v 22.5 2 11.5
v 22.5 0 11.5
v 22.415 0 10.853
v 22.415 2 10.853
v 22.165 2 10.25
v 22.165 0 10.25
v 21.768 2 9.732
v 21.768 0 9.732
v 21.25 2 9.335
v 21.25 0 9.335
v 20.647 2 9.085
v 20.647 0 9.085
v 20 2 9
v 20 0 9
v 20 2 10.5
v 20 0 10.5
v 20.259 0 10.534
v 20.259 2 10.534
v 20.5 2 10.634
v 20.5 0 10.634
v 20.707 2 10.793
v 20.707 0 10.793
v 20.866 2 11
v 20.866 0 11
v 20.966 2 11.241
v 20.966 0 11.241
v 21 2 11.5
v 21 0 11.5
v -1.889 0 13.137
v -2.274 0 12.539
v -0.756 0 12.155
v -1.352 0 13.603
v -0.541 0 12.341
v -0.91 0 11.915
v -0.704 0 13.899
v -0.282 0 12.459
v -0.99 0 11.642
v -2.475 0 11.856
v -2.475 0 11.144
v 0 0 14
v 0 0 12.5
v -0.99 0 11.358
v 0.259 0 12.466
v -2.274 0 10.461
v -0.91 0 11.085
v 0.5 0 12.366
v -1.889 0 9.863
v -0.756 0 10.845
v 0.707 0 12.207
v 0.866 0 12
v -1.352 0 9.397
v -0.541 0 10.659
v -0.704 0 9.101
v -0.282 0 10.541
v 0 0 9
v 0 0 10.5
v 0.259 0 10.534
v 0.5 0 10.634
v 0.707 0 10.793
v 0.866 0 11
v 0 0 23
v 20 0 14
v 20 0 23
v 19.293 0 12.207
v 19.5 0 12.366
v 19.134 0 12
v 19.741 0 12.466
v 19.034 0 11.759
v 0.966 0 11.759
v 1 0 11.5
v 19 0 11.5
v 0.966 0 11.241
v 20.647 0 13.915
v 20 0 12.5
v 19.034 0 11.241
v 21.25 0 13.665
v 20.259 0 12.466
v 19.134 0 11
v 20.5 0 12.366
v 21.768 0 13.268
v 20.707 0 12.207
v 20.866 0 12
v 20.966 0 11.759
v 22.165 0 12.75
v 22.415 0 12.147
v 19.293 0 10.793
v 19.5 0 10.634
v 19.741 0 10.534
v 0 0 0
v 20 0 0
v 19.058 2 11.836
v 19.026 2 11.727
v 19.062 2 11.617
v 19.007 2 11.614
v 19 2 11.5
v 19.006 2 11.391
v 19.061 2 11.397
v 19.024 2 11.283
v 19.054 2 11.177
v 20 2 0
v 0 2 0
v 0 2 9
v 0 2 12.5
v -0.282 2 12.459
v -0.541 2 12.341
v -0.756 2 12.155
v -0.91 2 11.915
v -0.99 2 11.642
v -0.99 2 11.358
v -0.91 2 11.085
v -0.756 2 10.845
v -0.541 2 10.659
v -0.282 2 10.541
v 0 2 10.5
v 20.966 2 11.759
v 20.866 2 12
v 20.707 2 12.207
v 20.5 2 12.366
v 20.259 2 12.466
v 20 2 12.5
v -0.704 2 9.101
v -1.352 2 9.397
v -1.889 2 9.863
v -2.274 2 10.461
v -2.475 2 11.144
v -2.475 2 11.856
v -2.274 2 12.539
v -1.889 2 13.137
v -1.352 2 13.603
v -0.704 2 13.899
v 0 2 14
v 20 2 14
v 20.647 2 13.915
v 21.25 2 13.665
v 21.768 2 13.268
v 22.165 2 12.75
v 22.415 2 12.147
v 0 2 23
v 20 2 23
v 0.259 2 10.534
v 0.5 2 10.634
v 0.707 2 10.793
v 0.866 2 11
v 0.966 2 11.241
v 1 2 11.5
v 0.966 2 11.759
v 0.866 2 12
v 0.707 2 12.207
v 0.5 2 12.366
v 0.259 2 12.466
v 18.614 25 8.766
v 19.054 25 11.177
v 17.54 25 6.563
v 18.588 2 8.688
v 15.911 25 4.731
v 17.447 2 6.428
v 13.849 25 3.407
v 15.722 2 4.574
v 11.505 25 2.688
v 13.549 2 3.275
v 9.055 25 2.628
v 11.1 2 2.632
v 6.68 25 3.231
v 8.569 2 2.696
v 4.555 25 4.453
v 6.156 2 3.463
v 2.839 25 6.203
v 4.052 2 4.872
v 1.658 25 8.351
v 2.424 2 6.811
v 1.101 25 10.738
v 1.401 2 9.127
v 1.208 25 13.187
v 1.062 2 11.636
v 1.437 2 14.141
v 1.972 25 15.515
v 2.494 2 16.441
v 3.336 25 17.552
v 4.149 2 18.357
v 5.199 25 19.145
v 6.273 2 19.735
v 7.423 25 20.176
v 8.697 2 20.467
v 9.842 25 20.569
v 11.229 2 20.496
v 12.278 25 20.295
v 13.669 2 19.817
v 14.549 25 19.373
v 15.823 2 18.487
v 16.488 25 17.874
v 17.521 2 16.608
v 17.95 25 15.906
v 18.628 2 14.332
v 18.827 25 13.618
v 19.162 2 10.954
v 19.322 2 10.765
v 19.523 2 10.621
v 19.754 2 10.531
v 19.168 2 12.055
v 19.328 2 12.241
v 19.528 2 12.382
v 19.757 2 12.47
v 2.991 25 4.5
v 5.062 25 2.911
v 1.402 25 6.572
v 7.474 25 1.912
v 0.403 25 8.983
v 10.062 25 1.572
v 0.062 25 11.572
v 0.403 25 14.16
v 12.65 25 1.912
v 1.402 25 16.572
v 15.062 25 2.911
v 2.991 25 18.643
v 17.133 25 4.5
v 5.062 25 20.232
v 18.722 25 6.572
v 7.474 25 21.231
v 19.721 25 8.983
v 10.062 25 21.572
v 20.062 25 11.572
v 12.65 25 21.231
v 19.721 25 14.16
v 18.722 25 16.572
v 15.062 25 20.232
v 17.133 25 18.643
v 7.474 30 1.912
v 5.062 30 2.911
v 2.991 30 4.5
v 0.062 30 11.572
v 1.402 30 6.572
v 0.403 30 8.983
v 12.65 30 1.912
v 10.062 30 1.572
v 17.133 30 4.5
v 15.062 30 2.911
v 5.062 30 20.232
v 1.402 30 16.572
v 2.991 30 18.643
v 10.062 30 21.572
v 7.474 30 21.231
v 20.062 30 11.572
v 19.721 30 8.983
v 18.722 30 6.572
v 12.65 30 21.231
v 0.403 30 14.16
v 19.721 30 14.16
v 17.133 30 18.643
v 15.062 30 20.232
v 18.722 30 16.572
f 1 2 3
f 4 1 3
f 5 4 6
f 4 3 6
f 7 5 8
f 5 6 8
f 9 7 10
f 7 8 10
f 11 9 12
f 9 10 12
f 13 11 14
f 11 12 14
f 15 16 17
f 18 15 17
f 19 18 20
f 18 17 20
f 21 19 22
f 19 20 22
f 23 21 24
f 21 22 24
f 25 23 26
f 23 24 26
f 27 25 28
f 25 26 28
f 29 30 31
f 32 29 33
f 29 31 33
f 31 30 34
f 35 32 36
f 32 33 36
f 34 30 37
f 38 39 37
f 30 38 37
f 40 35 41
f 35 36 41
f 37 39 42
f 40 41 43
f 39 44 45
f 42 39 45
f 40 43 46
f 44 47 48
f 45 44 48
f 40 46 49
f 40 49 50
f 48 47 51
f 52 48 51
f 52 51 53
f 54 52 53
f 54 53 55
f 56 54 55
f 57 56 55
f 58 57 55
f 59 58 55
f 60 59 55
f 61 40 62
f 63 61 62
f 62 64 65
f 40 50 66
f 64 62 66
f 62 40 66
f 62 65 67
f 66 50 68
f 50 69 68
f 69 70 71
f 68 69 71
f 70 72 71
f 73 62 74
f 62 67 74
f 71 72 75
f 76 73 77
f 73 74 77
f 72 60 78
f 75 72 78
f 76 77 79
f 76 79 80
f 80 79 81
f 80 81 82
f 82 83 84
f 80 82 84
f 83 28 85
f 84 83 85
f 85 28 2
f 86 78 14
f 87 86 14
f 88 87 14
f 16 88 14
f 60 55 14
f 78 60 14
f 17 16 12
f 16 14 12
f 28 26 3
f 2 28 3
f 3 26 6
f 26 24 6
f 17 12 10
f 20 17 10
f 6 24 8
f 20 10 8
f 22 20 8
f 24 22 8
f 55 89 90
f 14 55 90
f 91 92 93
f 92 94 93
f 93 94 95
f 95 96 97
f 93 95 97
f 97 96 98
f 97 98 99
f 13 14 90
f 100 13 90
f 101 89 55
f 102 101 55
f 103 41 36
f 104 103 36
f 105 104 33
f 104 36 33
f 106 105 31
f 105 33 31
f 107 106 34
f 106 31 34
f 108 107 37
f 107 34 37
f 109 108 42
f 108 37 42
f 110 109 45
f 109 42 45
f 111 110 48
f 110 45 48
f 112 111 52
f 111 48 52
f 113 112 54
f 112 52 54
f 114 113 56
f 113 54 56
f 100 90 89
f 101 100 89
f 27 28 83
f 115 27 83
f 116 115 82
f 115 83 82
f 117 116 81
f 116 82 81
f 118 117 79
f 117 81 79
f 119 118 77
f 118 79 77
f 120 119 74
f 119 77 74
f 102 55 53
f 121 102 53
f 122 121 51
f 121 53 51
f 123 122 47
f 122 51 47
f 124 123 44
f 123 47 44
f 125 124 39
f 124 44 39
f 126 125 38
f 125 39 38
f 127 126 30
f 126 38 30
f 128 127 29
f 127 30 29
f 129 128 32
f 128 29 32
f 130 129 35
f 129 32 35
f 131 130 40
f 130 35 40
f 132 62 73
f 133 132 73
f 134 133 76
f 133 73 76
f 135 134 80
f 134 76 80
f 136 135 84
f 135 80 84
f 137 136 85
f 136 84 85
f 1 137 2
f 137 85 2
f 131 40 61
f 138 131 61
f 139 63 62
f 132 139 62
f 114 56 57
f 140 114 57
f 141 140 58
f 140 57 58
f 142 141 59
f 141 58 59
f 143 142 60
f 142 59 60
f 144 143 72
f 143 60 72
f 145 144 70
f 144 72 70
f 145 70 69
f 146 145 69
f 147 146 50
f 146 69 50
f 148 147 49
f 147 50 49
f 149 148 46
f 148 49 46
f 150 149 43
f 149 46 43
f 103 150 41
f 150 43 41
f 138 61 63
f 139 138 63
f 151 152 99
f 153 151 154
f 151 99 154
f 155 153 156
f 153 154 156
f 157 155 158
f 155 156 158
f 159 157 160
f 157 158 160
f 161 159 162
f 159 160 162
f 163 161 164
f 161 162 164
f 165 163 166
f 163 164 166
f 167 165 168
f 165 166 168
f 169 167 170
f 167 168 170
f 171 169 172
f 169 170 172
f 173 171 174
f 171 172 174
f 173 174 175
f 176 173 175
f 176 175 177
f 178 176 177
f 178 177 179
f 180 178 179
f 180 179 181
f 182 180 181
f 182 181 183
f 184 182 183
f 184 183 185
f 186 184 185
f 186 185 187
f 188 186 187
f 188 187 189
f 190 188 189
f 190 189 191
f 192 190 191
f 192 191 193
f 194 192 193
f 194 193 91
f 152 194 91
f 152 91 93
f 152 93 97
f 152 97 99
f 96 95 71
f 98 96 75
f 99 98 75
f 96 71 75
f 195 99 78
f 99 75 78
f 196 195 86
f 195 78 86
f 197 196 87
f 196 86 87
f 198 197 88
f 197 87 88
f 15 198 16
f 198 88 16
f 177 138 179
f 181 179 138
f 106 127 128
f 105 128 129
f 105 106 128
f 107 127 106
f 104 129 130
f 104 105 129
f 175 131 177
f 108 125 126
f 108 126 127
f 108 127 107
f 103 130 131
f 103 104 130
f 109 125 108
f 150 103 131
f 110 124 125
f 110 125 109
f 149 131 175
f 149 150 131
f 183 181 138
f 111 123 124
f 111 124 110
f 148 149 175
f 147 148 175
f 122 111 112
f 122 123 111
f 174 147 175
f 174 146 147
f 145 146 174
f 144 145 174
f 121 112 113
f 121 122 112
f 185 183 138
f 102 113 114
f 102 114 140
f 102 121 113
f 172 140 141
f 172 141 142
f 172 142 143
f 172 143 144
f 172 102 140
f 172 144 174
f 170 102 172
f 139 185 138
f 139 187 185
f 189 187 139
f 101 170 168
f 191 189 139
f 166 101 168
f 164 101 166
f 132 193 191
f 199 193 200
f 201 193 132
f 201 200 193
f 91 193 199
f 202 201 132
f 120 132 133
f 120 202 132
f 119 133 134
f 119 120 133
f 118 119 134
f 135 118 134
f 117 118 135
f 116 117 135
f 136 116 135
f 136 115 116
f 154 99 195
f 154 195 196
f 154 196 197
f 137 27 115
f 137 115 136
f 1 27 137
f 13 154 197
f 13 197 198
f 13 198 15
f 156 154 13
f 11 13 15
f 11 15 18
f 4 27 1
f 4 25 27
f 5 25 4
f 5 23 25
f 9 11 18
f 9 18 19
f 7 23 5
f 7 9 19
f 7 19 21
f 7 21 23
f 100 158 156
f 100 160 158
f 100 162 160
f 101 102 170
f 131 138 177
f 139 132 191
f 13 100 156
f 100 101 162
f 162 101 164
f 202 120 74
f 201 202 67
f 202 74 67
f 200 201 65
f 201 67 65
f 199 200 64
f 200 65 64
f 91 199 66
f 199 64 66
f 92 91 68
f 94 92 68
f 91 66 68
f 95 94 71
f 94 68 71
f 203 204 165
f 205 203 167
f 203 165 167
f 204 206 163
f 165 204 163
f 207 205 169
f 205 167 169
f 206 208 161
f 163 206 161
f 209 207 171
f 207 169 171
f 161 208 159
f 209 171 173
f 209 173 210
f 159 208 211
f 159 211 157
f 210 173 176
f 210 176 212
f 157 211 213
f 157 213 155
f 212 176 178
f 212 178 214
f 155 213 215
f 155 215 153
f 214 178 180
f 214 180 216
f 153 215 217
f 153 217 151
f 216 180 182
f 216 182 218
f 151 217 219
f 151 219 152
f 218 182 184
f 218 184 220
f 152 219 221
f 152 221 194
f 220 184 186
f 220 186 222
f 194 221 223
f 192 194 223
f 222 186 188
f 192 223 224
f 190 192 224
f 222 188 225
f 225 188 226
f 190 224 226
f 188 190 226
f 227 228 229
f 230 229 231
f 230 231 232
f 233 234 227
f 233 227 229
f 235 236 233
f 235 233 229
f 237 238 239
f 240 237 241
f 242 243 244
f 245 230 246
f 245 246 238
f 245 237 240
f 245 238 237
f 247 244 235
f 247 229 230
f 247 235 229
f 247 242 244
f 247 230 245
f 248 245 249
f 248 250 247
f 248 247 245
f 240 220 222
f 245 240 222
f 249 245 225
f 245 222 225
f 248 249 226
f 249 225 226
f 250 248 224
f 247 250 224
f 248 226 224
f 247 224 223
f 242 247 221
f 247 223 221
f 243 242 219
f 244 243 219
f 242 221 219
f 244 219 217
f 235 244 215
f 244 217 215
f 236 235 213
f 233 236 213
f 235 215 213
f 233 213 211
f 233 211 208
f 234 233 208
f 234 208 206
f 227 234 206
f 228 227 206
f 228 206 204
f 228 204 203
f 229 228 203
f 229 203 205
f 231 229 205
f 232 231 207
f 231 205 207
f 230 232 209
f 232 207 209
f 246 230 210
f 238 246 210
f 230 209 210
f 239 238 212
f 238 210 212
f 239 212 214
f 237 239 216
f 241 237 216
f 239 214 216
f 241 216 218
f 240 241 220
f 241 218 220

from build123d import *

# Parameters (mm, degrees)
EXTRUDE_1_DEPTH = 2
SKETCH_2_R      = 9
EXTRUDE_2_DEPTH = 23
SKETCH_4_R      = 10
EXTRUDE_3_DEPTH = 5


with BuildPart() as part:
    # 草图1 → 凸台-拉伸1 (new body)
    with BuildSketch(Plane(origin=(0, 0, 0), x_dir=(1, 0, 0), z_dir=(0, 1, 0))):
        with BuildLine():
            Line((17.5, -11.5), (2.5, -11.5))
            ThreePointArc((2.5, -11.5), (1.767766953, -13.267766953), (0, -14))
            Line((0, -14), (0, -23))
            Line((0, -23), (20, -23))
            Line((20, -23), (20, -14))
            ThreePointArc((20, -14), (18.232233047, -13.267766953), (17.5, -11.5))
        make_face()
        with BuildLine():
            ThreePointArc((0, -9), (1.767766953, -9.732233047), (2.5, -11.5))
            Line((2.5, -11.5), (17.5, -11.5))
            ThreePointArc((17.5, -11.5), (18.232233047, -9.732233047), (20, -9))
            Line((20, -9), (20, 0))
            Line((20, 0), (0, 0))
            Line((0, 0), (0, -9))
        make_face()
        with BuildLine():
            ThreePointArc((0, -10.5), (0.707106781, -10.792893219), (1, -11.5))
            Line((1, -11.5), (2.5, -11.5))
            ThreePointArc((2.5, -11.5), (1.767766953, -9.732233047), (0, -9))
            Line((0, -9), (0, -10.5))
        make_face()
        with BuildLine():
            Line((2.5, -11.5), (1, -11.5))
            ThreePointArc((1, -11.5), (0.707106781, -12.207106781), (0, -12.5))
            Line((0, -12.5), (0, -14))
            ThreePointArc((0, -14), (1.767766953, -13.267766953), (2.5, -11.5))
        make_face()
        with BuildLine():
            ThreePointArc((0, -12.5), (-1, -11.5), (0, -10.5))
            Line((0, -10.5), (0, -9))
            ThreePointArc((0, -9), (-2.5, -11.5), (0, -14))
            Line((0, -14), (0, -12.5))
        make_face()
        with BuildLine():
            ThreePointArc((20, -9), (18.232233047, -9.732233047), (17.5, -11.5))
            Line((17.5, -11.5), (19, -11.5))
            ThreePointArc((19, -11.5), (19.292893219, -10.792893219), (20, -10.5))
            Line((20, -10.5), (20, -9))
        make_face()
        with BuildLine():
            Line((19, -11.5), (17.5, -11.5))
            ThreePointArc((17.5, -11.5), (18.232233047, -13.267766953), (20, -14))
            Line((20, -14), (20, -12.5))
            ThreePointArc((20, -12.5), (19.292893219, -12.207106781), (19, -11.5))
        make_face()
        with BuildLine():
            ThreePointArc((22.5, -11.5), (21.767766953, -9.732233047), (20, -9))
            Line((20, -9), (20, -10.5))
            ThreePointArc((20, -10.5), (20.707106781, -10.792893219), (21, -11.5))
            ThreePointArc((21, -11.5), (20.707106781, -12.207106781), (20, -12.5))
            Line((20, -12.5), (20, -14))
            ThreePointArc((20, -14), (21.767766953, -13.267766953), (22.5, -11.5))
        make_face()
    extrude(amount=EXTRUDE_1_DEPTH)

    # 草图2 → 凸台-拉伸2 (add)
    with BuildSketch(Plane(origin=(0, 2, 0), x_dir=(1, 0, 0), z_dir=(0, 1, 0))):
        with Locations(Location((10.062202952, -11.571533395, 0), (0, 0, 2.511658154))):
            Circle(SKETCH_2_R)
    extrude(amount=EXTRUDE_2_DEPTH)

    # 草图4 → 凸台-拉伸3 (add)
    with BuildSketch(Plane(origin=(0, 25, 0), x_dir=(1, 0, 0), z_dir=(0, 1, 0))):
        with Locations(Location((10.062202952, -11.571533395, 0), (0, 0, 270))):
            Circle(SKETCH_4_R)
    extrude(amount=EXTRUDE_3_DEPTH)


solid = part.part
